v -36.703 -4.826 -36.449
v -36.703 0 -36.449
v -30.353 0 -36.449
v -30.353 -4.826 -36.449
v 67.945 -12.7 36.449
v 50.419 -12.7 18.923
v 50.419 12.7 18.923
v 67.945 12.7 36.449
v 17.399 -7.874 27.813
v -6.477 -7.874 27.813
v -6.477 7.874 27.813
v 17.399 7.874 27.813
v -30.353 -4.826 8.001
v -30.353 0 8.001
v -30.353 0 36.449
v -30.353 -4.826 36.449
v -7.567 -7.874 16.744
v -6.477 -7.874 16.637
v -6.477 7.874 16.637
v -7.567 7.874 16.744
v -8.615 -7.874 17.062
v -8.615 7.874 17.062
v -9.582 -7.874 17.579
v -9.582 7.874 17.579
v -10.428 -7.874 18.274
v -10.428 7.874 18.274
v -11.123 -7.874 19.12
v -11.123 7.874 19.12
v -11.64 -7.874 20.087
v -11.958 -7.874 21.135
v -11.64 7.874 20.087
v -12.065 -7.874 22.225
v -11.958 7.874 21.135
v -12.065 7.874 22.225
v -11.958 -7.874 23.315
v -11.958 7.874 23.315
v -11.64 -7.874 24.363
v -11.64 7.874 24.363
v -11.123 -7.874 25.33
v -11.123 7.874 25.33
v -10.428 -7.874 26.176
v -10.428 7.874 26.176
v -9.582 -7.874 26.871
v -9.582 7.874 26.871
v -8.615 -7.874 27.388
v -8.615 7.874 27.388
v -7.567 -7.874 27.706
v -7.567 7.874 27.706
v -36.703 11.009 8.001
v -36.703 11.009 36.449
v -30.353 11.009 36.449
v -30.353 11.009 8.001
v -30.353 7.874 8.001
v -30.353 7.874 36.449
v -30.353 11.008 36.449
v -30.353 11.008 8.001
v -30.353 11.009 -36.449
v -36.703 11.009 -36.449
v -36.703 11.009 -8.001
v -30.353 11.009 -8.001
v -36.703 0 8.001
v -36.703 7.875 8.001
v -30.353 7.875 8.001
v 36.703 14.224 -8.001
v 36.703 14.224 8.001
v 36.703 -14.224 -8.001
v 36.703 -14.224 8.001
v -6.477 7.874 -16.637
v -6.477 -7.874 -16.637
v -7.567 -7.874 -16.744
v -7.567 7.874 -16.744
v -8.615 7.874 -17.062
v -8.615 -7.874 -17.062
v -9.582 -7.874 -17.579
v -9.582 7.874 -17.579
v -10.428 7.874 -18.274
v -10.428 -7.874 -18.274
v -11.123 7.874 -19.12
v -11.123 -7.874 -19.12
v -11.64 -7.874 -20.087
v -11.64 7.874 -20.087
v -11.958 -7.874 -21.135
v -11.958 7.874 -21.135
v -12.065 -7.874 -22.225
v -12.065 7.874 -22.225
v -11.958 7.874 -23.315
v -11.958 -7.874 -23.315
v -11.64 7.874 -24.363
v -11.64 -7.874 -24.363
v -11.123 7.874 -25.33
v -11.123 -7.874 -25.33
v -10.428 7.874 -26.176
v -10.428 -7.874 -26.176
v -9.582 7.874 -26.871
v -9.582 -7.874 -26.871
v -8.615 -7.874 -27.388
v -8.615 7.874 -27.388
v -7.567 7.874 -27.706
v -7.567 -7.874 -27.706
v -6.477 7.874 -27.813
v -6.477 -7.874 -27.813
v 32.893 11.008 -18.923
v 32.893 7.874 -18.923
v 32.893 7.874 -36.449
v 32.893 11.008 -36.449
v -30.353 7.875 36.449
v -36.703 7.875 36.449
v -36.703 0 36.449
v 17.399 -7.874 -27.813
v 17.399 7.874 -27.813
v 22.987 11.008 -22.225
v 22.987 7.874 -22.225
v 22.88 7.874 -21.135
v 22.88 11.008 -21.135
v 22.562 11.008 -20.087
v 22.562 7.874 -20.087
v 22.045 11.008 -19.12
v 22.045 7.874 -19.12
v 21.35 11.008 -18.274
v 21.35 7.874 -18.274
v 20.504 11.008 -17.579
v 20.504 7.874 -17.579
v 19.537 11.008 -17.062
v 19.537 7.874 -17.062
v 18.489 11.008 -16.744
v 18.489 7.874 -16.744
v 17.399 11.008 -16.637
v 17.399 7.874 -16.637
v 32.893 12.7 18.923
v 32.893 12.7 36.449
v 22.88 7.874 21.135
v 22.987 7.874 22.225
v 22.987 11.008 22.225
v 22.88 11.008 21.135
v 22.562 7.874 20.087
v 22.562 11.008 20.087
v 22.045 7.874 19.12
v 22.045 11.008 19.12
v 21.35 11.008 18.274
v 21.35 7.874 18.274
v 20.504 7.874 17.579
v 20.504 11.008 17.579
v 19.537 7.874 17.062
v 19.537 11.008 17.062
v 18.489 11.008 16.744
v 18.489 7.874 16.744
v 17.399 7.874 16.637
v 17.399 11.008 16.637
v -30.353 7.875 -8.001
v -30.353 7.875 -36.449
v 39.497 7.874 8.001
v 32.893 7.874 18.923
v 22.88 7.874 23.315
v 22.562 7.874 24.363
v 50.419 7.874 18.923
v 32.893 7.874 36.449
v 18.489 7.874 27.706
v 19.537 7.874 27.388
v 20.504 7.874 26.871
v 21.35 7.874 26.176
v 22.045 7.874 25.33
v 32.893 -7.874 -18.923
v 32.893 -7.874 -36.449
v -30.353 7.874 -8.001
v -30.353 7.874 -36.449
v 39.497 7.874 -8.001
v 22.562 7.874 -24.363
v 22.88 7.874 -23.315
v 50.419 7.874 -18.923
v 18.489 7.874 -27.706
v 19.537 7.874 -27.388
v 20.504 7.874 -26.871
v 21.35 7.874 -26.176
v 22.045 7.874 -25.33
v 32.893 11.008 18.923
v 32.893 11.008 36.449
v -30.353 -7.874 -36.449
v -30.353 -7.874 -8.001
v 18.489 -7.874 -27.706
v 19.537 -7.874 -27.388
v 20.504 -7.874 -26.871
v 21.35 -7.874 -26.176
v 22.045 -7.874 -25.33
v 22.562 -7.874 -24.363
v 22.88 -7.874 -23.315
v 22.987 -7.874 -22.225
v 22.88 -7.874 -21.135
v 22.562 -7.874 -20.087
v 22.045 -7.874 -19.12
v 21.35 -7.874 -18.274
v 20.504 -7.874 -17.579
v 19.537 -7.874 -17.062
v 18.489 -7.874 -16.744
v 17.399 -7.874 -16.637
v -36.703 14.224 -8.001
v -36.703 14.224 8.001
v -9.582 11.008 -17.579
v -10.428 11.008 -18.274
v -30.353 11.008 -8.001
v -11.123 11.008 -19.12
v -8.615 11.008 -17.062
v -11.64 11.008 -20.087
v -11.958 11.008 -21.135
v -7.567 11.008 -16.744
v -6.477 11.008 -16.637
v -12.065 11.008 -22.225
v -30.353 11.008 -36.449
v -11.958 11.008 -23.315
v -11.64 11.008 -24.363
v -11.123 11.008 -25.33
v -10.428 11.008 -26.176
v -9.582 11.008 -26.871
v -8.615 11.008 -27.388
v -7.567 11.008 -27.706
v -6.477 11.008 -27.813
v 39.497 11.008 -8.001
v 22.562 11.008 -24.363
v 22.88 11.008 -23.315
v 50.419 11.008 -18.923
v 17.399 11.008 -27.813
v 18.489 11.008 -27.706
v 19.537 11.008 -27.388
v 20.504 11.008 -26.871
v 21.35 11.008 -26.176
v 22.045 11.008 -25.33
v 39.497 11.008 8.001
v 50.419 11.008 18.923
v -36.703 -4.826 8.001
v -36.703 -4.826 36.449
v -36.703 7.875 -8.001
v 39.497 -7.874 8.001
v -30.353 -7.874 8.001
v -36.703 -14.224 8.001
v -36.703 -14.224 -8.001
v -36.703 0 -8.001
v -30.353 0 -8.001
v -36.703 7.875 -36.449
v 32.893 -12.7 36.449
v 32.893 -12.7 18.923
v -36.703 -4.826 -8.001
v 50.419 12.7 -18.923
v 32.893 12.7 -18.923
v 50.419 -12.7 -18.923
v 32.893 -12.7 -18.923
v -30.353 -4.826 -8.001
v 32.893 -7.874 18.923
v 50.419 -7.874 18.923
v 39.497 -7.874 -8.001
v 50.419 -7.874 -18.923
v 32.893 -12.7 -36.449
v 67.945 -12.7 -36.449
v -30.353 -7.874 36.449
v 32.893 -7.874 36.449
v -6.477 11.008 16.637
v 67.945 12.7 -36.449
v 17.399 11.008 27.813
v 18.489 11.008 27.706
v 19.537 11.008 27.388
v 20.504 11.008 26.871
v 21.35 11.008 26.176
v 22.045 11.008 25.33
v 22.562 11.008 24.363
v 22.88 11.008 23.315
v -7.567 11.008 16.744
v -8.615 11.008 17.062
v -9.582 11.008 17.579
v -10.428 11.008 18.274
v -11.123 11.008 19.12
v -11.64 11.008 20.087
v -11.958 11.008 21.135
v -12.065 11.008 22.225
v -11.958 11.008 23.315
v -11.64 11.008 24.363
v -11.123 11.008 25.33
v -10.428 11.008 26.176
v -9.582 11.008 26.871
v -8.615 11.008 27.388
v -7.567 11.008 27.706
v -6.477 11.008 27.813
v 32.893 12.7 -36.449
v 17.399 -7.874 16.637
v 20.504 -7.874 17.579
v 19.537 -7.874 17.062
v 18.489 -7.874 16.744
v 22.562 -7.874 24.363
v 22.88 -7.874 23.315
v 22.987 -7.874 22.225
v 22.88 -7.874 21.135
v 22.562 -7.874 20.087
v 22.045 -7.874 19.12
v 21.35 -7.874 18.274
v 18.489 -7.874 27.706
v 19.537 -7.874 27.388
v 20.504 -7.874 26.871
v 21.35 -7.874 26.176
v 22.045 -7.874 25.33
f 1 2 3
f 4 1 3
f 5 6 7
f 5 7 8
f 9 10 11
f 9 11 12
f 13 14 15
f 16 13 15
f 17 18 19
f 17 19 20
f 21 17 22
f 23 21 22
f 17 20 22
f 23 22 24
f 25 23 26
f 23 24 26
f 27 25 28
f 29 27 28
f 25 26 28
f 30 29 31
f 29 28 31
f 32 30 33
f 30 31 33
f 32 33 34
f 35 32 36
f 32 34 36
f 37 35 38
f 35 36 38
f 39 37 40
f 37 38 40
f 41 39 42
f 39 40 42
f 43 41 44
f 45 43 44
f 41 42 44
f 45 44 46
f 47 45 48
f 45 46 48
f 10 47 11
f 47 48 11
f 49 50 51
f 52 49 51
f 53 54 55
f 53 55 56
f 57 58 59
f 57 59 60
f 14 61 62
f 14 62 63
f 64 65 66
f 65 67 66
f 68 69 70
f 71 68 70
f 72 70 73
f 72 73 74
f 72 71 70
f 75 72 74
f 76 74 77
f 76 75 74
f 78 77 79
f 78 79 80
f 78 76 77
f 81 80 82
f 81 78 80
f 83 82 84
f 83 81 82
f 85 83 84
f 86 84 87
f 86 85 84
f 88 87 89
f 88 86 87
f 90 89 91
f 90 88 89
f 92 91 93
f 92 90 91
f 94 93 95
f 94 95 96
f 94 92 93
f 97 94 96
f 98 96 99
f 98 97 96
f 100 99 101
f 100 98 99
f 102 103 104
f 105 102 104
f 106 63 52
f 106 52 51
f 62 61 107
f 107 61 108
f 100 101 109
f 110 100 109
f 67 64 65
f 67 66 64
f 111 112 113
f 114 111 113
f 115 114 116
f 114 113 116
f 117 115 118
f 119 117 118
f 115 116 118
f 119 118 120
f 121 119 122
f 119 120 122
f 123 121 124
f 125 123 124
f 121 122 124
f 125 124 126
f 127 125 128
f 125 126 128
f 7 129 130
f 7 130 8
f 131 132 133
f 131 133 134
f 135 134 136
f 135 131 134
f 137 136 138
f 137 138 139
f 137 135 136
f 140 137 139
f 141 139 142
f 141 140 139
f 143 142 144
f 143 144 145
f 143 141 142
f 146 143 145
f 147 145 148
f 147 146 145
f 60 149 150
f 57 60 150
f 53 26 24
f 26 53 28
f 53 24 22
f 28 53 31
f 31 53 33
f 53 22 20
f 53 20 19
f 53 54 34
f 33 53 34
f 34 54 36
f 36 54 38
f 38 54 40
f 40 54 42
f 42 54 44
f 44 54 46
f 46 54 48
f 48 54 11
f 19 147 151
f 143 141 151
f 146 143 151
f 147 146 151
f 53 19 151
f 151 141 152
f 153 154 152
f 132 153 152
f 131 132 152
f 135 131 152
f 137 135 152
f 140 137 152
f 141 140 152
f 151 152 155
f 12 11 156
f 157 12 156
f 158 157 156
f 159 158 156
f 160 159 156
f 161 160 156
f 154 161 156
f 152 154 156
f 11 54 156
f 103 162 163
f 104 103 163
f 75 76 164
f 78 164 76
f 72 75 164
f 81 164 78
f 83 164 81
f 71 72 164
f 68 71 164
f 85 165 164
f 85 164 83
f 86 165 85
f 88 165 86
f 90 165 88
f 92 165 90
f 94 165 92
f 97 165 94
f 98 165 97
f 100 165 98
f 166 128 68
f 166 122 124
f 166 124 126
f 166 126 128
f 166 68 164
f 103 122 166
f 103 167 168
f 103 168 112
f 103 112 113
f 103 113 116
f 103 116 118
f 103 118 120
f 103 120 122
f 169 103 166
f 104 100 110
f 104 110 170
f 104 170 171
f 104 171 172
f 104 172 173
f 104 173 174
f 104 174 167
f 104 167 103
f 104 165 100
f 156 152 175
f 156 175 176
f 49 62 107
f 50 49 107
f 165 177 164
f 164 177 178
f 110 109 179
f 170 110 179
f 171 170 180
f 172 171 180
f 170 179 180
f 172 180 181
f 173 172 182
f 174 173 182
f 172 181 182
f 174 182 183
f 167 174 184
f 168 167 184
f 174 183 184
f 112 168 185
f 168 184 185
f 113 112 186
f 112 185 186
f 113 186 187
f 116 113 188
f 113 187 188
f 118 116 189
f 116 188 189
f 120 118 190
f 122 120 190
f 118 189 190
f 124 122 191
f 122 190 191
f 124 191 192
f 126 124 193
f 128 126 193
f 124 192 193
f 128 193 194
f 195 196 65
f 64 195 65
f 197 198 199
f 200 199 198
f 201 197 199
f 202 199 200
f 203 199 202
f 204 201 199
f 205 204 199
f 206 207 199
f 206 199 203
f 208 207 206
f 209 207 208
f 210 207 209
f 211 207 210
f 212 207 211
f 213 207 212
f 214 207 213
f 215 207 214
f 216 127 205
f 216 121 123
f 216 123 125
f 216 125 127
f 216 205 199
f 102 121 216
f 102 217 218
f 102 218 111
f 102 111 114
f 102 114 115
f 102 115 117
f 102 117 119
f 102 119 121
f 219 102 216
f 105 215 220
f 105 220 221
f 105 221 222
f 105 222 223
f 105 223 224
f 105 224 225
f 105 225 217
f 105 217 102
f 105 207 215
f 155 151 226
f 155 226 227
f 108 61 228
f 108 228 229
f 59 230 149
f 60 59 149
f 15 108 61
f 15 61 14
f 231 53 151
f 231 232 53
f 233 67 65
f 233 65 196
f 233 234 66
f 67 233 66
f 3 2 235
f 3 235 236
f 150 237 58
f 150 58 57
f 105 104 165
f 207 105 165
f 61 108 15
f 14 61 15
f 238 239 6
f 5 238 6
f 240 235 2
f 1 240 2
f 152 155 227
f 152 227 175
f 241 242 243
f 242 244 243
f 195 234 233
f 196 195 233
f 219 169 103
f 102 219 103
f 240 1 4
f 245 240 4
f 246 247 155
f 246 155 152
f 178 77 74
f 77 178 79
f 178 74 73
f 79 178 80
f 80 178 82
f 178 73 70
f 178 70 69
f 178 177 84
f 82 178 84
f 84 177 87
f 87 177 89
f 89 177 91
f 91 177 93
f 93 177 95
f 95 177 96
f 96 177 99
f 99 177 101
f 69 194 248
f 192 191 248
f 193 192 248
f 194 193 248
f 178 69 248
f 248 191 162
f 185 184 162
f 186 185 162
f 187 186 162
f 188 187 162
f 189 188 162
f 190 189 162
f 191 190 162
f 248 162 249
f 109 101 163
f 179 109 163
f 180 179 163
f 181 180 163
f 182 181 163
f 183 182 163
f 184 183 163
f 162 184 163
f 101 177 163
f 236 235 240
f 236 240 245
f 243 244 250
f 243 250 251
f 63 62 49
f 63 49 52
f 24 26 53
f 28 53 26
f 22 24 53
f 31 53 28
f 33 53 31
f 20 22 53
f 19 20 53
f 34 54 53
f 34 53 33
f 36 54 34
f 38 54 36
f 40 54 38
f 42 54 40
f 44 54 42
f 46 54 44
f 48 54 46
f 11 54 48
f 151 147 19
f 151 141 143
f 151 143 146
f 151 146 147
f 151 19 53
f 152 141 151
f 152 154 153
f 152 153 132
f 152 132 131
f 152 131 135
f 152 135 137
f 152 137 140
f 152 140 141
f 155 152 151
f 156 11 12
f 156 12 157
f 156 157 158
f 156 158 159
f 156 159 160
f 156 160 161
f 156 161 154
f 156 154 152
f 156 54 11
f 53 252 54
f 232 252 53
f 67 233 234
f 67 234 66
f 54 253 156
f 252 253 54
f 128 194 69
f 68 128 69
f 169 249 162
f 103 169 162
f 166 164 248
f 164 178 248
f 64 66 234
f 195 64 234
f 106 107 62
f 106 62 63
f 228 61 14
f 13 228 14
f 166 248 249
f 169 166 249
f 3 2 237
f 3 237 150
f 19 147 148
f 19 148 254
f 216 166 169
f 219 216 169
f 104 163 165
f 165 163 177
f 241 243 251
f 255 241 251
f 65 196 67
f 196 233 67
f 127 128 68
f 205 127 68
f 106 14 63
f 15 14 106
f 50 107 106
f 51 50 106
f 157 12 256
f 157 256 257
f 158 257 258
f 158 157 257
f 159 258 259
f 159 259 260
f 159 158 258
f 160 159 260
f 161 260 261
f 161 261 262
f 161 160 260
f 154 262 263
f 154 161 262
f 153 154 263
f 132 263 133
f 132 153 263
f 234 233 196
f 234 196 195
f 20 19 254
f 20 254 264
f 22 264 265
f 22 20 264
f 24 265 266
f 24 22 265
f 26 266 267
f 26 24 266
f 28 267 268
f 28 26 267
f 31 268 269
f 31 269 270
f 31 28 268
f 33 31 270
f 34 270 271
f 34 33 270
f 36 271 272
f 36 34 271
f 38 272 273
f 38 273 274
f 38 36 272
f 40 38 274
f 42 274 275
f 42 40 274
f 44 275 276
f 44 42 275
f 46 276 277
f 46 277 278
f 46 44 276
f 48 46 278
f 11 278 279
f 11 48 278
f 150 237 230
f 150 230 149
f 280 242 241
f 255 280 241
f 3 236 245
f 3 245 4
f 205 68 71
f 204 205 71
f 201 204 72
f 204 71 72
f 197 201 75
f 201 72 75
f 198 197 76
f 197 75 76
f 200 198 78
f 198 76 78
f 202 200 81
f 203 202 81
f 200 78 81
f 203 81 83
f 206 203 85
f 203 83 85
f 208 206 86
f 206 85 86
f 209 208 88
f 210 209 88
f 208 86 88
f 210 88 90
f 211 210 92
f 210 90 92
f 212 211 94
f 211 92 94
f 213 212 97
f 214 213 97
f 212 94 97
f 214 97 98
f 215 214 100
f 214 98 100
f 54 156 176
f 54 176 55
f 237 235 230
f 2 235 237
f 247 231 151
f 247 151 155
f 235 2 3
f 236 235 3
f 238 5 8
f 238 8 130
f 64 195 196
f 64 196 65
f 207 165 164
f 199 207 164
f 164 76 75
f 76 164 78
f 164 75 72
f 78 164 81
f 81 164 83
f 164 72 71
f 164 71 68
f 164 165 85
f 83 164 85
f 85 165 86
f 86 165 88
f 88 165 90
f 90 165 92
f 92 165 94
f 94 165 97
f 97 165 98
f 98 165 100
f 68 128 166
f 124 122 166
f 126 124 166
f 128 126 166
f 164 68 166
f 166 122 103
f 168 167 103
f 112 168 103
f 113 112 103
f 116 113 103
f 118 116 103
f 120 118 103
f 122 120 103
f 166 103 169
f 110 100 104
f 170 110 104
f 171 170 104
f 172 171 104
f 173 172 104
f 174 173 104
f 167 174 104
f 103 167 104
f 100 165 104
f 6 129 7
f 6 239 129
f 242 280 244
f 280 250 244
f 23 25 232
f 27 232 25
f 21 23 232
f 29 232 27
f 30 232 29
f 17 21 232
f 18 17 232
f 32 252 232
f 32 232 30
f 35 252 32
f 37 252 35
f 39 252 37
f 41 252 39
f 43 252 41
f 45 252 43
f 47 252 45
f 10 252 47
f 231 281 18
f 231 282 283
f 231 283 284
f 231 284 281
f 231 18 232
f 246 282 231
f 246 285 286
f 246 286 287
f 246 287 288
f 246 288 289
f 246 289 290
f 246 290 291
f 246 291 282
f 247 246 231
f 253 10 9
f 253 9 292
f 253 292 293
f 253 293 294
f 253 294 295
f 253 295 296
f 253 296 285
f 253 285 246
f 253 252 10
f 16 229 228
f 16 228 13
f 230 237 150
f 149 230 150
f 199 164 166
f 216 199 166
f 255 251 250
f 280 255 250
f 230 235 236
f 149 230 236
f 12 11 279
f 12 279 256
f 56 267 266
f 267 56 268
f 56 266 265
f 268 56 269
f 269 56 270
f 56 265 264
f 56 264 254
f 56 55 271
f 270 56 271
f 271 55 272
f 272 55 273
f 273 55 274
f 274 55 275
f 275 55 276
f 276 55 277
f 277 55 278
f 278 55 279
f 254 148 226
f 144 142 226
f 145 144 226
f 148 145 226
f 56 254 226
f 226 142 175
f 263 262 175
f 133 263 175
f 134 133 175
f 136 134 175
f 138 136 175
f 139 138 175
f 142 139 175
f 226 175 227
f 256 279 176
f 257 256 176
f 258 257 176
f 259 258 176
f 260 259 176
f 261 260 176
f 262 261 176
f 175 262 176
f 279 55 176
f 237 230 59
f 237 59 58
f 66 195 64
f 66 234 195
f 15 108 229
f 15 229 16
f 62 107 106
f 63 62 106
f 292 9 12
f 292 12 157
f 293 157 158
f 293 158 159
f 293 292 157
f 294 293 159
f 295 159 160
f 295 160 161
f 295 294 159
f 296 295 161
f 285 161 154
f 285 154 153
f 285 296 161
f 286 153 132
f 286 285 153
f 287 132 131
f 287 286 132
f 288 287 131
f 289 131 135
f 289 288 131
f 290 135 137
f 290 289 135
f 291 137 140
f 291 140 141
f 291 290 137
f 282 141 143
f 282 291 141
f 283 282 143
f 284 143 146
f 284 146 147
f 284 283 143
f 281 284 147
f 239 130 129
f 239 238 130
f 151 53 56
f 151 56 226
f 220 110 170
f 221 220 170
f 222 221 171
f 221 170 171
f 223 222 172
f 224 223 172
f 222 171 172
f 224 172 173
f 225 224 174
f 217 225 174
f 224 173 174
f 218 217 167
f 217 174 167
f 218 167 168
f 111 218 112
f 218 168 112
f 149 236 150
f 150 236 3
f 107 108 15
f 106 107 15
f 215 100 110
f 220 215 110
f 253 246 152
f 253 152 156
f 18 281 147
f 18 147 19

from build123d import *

# Parameters (mm, degrees)
F1_DEPTH = 12.7
F2_DEPTH = 14.224
F3_DEPTH = 7.874
F0_W     = 6.35
F0_H     = 28.448
F4_DEPTH = 4.826
F5_DEPTH = 7.8748036176
F6_DEPTH = 3.1338469125


with BuildPart() as f1:
    # F0 (on Front) → F1 (new body, symmetric)
    with BuildSketch(Plane.XZ):
        Polygon((32.893, 18.923), (50.419, 18.923), (67.945, 36.449), (32.893, 36.449), align=None)
    extrude(amount=F1_DEPTH, both=True)


with BuildPart() as f2:
    # F0 (on Front) → F2 (new body, symmetric)
    with BuildSketch(Plane.XZ):
        Polygon((36.703, -8.001), (36.703, 8.001), (-30.353, 8.001), (-36.703, 8.001), (-36.703, -8.001), align=None)
    extrude(amount=F2_DEPTH, both=True)


with BuildPart() as f3:
    # F0 (on Front) → F3 (new body, symmetric)
    with BuildSketch(Plane.XZ):
        Polygon((-30.353, 8.001), (36.703, 8.001), (39.497, 8.001), (50.419, 18.923), (32.893, 18.923), (32.893, 36.449), (-30.353, 36.449), align=None)
        with BuildLine():
            ThreePointArc((-6.477, 16.637), (-12.065, 22.225), (-6.477, 27.813))
            Line((-6.477, 27.813), (17.399, 27.813))
            ThreePointArc((17.399, 27.813), (21.3503126933, 26.1763126933), (22.987, 22.225))
            ThreePointArc((22.987, 22.225), (21.3503126933, 18.2736873067), (17.399, 16.637))
            Line((17.399, 16.637), (-6.477, 16.637))
        make_face(mode=Mode.SUBTRACT)
    extrude(amount=F3_DEPTH, both=True)


with BuildPart() as f4:
    # F0 (on Front) → F4 (new body)
    with BuildSketch(Plane.XZ):
        with Locations((-33.528, 22.225)):
            Rectangle(F0_W, F0_H)
    extrude(amount=F4_DEPTH)


with BuildPart() as f5:
    # F0 (on Front) → F5 (new body)
    with BuildSketch(Plane.XZ):
        with Locations((-33.528, 22.225)):
            Rectangle(F0_W, F0_H)
    extrude(amount=-F5_DEPTH)


with BuildPart() as f6:
    # F6 (new): a face of the model
    f6_faces = [f5.part.faces().sort_by_distance(p)[0] for p in [
        (-33.528, 7.8748036176, 22.225),
    ]]
    extrude(f6_faces, amount=F6_DEPTH)


with BuildPart() as f6b:
    # F6#2 (new): a face of the model
    f6_2_faces = [f3.part.faces().sort_by_distance(p)[0] for p in [
        (4.572, 7.874, 8.8573530048),
    ]]
    extrude(f6_2_faces, amount=F6_DEPTH)


with BuildPart() as f7_1:
    # F7: instance of F2
    add(f2.part.mirror(Plane.XY))


with BuildPart() as f7_2:
    # F7: instance of F3
    add(f3.part.mirror(Plane.XY))


with BuildPart() as f7_3:
    # F7: instance of F4
    add(f4.part.mirror(Plane.XY))


with BuildPart() as f7_4:
    # F7: instance of F5
    add(f5.part.mirror(Plane.XY))


with BuildPart() as f7_5:
    # F7: instance of F6
    add(f6.part.mirror(Plane.XY))


with BuildPart() as f7_6:
    # F7: instance of F6b
    add(f6b.part.mirror(Plane.XY))


with BuildPart() as f7_7:
    # F7: instance of F1
    add(f1.part.mirror(Plane.XY))


solid = Compound([f1.part, f2.part, f3.part, f4.part, f5.part, f6.part, f6b.part, f7_1.part, f7_2.part, f7_3.part, f7_4.part, f7_5.part, f7_6.part, f7_7.part])
